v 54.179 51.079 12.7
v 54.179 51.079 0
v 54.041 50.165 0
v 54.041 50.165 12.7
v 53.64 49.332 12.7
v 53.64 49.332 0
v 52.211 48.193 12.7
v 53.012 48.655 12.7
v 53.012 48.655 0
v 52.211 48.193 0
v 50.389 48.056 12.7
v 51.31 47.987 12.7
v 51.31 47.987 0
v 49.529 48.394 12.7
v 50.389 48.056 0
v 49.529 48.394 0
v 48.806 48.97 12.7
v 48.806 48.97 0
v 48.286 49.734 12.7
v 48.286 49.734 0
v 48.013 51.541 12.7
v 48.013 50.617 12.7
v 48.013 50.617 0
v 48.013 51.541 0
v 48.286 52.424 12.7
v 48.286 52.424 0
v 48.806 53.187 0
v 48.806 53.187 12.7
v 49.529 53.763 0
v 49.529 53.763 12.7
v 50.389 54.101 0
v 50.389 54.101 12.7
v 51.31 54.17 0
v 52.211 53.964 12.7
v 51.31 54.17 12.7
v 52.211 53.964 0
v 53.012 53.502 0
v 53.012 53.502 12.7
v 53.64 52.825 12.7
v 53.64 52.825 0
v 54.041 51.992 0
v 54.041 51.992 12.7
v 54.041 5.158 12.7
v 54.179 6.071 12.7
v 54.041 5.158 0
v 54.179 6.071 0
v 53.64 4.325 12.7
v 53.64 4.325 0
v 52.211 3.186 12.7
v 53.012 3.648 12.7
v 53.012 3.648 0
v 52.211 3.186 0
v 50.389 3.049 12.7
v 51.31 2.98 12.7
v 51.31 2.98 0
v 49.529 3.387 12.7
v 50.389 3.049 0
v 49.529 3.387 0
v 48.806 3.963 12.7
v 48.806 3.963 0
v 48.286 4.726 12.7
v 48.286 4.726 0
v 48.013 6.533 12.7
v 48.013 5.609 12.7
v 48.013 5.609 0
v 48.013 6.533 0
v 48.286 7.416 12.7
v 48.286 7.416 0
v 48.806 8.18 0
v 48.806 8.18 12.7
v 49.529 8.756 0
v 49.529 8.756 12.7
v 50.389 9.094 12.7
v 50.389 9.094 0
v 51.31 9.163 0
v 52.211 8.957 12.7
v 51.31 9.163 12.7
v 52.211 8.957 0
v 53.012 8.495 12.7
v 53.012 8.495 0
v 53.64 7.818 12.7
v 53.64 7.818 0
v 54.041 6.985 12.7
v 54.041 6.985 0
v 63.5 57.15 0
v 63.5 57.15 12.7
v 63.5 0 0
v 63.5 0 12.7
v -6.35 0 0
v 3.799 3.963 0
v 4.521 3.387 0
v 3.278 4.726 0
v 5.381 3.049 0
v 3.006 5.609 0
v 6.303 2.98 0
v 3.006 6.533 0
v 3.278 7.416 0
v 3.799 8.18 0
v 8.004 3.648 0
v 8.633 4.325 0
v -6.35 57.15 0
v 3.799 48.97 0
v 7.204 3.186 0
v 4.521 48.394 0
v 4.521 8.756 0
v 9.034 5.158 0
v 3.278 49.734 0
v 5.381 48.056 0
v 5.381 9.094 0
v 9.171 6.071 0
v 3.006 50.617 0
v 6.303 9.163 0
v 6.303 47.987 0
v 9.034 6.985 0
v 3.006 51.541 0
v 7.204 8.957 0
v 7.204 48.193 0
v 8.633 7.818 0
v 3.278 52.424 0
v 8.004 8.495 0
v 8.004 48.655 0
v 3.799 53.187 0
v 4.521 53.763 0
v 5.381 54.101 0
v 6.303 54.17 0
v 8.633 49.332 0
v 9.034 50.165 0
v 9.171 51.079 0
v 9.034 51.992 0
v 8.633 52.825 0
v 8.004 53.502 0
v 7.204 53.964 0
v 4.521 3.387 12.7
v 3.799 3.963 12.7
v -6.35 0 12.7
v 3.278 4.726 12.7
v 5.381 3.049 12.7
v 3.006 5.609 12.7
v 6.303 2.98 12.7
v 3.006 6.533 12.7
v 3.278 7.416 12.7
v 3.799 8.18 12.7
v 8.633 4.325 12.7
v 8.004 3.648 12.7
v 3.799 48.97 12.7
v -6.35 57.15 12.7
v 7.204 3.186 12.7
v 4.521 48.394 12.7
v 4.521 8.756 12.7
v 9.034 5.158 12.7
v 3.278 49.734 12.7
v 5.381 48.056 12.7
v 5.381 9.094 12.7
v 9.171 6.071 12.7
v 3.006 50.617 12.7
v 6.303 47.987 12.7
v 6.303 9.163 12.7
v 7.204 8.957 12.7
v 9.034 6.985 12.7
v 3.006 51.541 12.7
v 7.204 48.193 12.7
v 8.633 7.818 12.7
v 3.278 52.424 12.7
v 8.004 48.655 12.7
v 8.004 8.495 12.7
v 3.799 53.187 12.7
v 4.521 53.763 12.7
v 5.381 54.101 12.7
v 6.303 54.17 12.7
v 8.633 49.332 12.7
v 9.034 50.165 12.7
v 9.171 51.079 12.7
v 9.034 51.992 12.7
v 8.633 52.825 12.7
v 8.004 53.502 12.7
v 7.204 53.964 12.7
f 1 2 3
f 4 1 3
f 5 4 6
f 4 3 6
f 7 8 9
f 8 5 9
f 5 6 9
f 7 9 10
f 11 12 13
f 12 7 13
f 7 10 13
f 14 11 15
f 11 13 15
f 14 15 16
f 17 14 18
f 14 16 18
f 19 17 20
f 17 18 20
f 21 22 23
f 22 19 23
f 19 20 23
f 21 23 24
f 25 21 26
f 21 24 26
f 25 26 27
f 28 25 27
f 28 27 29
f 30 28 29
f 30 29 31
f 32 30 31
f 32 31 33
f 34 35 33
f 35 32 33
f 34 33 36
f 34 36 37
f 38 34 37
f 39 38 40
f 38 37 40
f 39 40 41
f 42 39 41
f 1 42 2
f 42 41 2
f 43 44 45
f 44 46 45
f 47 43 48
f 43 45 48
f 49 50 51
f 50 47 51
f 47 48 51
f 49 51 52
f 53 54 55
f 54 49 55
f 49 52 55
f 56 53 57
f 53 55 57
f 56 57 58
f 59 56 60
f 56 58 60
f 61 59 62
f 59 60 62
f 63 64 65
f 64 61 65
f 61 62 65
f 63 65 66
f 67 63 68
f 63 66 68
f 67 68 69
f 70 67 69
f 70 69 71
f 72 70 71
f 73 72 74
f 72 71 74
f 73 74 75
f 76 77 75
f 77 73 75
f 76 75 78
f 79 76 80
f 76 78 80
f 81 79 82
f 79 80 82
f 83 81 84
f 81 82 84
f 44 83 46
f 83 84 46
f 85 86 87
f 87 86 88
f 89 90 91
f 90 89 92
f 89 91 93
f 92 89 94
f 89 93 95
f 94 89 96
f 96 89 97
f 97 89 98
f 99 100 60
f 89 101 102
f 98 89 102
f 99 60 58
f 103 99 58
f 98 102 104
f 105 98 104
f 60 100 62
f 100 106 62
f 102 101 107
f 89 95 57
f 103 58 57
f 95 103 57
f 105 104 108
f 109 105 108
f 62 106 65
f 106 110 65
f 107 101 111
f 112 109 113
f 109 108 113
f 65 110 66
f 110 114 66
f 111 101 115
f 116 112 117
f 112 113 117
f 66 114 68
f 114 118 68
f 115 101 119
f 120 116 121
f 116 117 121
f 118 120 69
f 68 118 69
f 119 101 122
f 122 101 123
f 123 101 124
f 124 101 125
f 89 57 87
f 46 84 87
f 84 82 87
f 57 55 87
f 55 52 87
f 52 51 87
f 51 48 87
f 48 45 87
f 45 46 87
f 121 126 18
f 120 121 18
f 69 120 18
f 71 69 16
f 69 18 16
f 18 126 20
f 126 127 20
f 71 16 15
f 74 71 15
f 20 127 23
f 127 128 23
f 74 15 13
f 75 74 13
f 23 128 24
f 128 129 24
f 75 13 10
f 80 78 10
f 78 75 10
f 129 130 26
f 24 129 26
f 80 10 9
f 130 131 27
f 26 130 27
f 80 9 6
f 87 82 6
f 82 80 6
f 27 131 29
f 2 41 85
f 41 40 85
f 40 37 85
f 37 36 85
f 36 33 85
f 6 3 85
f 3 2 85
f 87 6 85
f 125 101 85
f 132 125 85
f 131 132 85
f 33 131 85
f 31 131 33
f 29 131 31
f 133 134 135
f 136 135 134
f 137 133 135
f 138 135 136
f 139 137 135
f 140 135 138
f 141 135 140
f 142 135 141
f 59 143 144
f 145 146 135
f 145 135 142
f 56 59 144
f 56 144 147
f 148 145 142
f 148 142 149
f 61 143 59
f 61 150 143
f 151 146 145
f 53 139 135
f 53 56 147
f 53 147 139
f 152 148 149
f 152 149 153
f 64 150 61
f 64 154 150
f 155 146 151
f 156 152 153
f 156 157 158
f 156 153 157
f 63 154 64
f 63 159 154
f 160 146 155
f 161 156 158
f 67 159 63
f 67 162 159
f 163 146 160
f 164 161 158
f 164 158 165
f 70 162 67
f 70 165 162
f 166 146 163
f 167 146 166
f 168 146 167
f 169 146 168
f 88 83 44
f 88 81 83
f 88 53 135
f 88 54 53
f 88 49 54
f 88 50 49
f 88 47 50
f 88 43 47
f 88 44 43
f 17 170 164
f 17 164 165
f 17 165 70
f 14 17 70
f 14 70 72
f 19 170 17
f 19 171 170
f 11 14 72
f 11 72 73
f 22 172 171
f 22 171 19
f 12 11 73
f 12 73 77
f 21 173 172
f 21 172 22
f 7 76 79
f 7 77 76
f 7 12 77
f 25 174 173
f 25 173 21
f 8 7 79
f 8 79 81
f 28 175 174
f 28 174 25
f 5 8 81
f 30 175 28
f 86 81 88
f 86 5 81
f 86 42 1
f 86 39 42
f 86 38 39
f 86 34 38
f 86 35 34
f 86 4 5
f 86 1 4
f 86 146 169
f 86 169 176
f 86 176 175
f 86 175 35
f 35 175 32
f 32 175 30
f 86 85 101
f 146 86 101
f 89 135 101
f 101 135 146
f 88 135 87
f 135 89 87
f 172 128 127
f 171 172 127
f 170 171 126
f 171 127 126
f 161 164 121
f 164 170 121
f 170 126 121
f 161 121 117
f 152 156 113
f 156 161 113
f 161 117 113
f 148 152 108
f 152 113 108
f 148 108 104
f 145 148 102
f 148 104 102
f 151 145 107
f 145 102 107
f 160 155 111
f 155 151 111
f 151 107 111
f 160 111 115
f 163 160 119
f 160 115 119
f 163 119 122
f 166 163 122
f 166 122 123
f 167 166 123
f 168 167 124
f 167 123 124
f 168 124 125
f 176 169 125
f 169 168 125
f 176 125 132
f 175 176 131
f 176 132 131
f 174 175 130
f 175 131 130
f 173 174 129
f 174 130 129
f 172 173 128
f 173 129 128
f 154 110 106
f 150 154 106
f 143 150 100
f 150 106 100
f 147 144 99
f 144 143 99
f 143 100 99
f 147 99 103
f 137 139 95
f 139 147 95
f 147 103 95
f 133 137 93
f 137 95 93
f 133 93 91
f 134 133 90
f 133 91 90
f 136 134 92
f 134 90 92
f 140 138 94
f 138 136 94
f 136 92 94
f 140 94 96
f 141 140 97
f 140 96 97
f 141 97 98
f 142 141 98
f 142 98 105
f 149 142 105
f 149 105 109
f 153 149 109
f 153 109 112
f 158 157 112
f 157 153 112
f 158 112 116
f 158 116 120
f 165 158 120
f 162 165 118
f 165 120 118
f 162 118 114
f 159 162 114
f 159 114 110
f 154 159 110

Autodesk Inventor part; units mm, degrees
ref_plane "YZ Plane" through (0, 0, 0) normal (1, 0, 0) x (0, 1, 0)
ref_plane "XZ Plane" through (0, 0, 0) normal (0, 1, 0) x (-1, 0, 0)
ref_plane "XY Plane" through (0, 0, 0) normal (0, 0, 1) x (1, 0, 0)
sketch "Sketch1" plane through (0, 0, 0) normal (0, 0, 1) x (1, 0, 0)
  line L0 (0, 0) -> (57.15, 0)
  line L1 (57.15, 0) -> (57.15, 57.15)
  line L2 (57.15, 57.15) -> (0, 57.15)
  line L3 (0, 57.15) -> (0, 0)
  line L4 (0, 57.15) -> (57.15, 0) construction
  circle A0 centre (28.575, 28.575) radius 31.825 construction
  line L5 (0, 0) -> (57.15, 57.15) construction
  circle A1 centre (6.0713, 51.0787) radius 3.1
  circle A2 centre (6.0713, 6.0713) radius 3.1
  circle A3 centre (51.0787, 6.0713) radius 3.1
  circle A4 centre (51.0787, 51.0787) radius 3.1
  dimension "d2" = 63.65
  dimension "d0" = 57.15
  dimension "d1" = 57.15
  dimension "d3" = 6.2
  dimension "d6" = 360
extrude "Extrusion1" add sketch "Sketch1" along normal blind 12.7
sketch "Sketch2" plane through (0, 0, 12.7) normal (0, 0, 1) x (1, 0, 0)
  line L0 (0, 0) -> (-6.35, 0)
  line L1 (-6.35, 0) -> (-6.35, 57.15)
  line L2 (-6.35, 57.15) -> (0, 57.15)
  line L3 (0, 57.15) -> (0, 0)
  line L4 (57.15, 0) -> (57.15, 57.15) projected
  line L5 (57.15, 57.15) -> (63.5, 57.15)
  line L6 (63.5, 57.15) -> (63.5, 0)
  line L7 (63.5, 0) -> (57.15, 0)
  line L8 (57.15, 0) -> (57.15, 57.15)
  dimension "d10" = 6.35
  dimension "d11" = 6.35
extrude "Extrusion2" add sketch "Sketch2" against normal up to surface (12.7 mm away)
properties part number "polycarb_back" material "Polycarbonate, Smoke"
